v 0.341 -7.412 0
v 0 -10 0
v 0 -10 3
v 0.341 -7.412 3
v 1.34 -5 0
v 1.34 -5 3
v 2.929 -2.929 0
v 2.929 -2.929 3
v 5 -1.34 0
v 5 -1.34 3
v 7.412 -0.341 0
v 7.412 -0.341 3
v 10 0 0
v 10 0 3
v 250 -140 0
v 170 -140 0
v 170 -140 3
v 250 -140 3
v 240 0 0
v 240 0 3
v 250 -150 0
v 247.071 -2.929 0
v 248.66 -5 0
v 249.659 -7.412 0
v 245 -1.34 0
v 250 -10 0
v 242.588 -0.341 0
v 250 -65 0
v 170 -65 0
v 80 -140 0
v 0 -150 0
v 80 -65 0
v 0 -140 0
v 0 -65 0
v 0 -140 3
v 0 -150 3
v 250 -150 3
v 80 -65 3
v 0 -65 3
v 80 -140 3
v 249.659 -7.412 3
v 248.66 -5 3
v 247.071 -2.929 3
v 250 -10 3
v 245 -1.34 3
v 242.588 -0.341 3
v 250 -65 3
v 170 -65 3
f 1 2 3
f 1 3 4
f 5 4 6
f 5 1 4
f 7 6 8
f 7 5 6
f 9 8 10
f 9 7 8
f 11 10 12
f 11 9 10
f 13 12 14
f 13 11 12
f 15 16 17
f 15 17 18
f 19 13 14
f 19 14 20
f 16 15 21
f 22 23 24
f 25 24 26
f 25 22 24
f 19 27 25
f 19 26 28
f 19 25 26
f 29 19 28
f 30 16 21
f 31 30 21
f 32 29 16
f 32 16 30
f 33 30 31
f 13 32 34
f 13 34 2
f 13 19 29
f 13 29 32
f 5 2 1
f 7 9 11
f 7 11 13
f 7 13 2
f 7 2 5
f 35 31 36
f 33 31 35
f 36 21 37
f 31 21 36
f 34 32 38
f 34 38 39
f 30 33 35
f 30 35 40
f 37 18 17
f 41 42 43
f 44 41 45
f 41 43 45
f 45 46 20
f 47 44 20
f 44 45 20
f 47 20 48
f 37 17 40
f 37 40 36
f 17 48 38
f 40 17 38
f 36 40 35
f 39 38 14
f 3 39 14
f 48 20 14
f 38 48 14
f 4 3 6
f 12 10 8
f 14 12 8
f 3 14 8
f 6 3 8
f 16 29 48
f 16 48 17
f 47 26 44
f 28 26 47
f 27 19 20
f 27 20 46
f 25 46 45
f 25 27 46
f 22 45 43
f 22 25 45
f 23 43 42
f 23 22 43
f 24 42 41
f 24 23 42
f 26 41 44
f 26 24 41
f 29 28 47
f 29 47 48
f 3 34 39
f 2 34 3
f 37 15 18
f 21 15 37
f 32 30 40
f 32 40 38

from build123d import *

# Parameters (mm, degrees)
BOSS_EXTRUDE1_DEPTH = 3


with BuildPart() as part:
    # Sketch1 → Boss-Extrude1 (new body)
    with BuildSketch(Plane.XY):
        with BuildLine():
            Line((10, 0), (240, 0))
            ThreePointArc((240, 0), (247.071067812, -2.928932188), (250, -10))
            Line((250, -10), (250, -65))
            Line((250, -65), (170, -65))
            Line((170, -65), (170, -140))
            Line((170, -140), (250, -140))
            Line((250, -140), (250, -150))
            Line((250, -150), (0, -150))
            Line((0, -150), (0, -140))
            Line((0, -140), (80, -140))
            Line((80, -140), (80, -65))
            Line((80, -65), (0, -65))
            Line((0, -65), (0, -10))
            ThreePointArc((0, -10), (2.928932188, -2.928932188), (10, 0))
        make_face()
    extrude(amount=BOSS_EXTRUDE1_DEPTH)


solid = part.part
